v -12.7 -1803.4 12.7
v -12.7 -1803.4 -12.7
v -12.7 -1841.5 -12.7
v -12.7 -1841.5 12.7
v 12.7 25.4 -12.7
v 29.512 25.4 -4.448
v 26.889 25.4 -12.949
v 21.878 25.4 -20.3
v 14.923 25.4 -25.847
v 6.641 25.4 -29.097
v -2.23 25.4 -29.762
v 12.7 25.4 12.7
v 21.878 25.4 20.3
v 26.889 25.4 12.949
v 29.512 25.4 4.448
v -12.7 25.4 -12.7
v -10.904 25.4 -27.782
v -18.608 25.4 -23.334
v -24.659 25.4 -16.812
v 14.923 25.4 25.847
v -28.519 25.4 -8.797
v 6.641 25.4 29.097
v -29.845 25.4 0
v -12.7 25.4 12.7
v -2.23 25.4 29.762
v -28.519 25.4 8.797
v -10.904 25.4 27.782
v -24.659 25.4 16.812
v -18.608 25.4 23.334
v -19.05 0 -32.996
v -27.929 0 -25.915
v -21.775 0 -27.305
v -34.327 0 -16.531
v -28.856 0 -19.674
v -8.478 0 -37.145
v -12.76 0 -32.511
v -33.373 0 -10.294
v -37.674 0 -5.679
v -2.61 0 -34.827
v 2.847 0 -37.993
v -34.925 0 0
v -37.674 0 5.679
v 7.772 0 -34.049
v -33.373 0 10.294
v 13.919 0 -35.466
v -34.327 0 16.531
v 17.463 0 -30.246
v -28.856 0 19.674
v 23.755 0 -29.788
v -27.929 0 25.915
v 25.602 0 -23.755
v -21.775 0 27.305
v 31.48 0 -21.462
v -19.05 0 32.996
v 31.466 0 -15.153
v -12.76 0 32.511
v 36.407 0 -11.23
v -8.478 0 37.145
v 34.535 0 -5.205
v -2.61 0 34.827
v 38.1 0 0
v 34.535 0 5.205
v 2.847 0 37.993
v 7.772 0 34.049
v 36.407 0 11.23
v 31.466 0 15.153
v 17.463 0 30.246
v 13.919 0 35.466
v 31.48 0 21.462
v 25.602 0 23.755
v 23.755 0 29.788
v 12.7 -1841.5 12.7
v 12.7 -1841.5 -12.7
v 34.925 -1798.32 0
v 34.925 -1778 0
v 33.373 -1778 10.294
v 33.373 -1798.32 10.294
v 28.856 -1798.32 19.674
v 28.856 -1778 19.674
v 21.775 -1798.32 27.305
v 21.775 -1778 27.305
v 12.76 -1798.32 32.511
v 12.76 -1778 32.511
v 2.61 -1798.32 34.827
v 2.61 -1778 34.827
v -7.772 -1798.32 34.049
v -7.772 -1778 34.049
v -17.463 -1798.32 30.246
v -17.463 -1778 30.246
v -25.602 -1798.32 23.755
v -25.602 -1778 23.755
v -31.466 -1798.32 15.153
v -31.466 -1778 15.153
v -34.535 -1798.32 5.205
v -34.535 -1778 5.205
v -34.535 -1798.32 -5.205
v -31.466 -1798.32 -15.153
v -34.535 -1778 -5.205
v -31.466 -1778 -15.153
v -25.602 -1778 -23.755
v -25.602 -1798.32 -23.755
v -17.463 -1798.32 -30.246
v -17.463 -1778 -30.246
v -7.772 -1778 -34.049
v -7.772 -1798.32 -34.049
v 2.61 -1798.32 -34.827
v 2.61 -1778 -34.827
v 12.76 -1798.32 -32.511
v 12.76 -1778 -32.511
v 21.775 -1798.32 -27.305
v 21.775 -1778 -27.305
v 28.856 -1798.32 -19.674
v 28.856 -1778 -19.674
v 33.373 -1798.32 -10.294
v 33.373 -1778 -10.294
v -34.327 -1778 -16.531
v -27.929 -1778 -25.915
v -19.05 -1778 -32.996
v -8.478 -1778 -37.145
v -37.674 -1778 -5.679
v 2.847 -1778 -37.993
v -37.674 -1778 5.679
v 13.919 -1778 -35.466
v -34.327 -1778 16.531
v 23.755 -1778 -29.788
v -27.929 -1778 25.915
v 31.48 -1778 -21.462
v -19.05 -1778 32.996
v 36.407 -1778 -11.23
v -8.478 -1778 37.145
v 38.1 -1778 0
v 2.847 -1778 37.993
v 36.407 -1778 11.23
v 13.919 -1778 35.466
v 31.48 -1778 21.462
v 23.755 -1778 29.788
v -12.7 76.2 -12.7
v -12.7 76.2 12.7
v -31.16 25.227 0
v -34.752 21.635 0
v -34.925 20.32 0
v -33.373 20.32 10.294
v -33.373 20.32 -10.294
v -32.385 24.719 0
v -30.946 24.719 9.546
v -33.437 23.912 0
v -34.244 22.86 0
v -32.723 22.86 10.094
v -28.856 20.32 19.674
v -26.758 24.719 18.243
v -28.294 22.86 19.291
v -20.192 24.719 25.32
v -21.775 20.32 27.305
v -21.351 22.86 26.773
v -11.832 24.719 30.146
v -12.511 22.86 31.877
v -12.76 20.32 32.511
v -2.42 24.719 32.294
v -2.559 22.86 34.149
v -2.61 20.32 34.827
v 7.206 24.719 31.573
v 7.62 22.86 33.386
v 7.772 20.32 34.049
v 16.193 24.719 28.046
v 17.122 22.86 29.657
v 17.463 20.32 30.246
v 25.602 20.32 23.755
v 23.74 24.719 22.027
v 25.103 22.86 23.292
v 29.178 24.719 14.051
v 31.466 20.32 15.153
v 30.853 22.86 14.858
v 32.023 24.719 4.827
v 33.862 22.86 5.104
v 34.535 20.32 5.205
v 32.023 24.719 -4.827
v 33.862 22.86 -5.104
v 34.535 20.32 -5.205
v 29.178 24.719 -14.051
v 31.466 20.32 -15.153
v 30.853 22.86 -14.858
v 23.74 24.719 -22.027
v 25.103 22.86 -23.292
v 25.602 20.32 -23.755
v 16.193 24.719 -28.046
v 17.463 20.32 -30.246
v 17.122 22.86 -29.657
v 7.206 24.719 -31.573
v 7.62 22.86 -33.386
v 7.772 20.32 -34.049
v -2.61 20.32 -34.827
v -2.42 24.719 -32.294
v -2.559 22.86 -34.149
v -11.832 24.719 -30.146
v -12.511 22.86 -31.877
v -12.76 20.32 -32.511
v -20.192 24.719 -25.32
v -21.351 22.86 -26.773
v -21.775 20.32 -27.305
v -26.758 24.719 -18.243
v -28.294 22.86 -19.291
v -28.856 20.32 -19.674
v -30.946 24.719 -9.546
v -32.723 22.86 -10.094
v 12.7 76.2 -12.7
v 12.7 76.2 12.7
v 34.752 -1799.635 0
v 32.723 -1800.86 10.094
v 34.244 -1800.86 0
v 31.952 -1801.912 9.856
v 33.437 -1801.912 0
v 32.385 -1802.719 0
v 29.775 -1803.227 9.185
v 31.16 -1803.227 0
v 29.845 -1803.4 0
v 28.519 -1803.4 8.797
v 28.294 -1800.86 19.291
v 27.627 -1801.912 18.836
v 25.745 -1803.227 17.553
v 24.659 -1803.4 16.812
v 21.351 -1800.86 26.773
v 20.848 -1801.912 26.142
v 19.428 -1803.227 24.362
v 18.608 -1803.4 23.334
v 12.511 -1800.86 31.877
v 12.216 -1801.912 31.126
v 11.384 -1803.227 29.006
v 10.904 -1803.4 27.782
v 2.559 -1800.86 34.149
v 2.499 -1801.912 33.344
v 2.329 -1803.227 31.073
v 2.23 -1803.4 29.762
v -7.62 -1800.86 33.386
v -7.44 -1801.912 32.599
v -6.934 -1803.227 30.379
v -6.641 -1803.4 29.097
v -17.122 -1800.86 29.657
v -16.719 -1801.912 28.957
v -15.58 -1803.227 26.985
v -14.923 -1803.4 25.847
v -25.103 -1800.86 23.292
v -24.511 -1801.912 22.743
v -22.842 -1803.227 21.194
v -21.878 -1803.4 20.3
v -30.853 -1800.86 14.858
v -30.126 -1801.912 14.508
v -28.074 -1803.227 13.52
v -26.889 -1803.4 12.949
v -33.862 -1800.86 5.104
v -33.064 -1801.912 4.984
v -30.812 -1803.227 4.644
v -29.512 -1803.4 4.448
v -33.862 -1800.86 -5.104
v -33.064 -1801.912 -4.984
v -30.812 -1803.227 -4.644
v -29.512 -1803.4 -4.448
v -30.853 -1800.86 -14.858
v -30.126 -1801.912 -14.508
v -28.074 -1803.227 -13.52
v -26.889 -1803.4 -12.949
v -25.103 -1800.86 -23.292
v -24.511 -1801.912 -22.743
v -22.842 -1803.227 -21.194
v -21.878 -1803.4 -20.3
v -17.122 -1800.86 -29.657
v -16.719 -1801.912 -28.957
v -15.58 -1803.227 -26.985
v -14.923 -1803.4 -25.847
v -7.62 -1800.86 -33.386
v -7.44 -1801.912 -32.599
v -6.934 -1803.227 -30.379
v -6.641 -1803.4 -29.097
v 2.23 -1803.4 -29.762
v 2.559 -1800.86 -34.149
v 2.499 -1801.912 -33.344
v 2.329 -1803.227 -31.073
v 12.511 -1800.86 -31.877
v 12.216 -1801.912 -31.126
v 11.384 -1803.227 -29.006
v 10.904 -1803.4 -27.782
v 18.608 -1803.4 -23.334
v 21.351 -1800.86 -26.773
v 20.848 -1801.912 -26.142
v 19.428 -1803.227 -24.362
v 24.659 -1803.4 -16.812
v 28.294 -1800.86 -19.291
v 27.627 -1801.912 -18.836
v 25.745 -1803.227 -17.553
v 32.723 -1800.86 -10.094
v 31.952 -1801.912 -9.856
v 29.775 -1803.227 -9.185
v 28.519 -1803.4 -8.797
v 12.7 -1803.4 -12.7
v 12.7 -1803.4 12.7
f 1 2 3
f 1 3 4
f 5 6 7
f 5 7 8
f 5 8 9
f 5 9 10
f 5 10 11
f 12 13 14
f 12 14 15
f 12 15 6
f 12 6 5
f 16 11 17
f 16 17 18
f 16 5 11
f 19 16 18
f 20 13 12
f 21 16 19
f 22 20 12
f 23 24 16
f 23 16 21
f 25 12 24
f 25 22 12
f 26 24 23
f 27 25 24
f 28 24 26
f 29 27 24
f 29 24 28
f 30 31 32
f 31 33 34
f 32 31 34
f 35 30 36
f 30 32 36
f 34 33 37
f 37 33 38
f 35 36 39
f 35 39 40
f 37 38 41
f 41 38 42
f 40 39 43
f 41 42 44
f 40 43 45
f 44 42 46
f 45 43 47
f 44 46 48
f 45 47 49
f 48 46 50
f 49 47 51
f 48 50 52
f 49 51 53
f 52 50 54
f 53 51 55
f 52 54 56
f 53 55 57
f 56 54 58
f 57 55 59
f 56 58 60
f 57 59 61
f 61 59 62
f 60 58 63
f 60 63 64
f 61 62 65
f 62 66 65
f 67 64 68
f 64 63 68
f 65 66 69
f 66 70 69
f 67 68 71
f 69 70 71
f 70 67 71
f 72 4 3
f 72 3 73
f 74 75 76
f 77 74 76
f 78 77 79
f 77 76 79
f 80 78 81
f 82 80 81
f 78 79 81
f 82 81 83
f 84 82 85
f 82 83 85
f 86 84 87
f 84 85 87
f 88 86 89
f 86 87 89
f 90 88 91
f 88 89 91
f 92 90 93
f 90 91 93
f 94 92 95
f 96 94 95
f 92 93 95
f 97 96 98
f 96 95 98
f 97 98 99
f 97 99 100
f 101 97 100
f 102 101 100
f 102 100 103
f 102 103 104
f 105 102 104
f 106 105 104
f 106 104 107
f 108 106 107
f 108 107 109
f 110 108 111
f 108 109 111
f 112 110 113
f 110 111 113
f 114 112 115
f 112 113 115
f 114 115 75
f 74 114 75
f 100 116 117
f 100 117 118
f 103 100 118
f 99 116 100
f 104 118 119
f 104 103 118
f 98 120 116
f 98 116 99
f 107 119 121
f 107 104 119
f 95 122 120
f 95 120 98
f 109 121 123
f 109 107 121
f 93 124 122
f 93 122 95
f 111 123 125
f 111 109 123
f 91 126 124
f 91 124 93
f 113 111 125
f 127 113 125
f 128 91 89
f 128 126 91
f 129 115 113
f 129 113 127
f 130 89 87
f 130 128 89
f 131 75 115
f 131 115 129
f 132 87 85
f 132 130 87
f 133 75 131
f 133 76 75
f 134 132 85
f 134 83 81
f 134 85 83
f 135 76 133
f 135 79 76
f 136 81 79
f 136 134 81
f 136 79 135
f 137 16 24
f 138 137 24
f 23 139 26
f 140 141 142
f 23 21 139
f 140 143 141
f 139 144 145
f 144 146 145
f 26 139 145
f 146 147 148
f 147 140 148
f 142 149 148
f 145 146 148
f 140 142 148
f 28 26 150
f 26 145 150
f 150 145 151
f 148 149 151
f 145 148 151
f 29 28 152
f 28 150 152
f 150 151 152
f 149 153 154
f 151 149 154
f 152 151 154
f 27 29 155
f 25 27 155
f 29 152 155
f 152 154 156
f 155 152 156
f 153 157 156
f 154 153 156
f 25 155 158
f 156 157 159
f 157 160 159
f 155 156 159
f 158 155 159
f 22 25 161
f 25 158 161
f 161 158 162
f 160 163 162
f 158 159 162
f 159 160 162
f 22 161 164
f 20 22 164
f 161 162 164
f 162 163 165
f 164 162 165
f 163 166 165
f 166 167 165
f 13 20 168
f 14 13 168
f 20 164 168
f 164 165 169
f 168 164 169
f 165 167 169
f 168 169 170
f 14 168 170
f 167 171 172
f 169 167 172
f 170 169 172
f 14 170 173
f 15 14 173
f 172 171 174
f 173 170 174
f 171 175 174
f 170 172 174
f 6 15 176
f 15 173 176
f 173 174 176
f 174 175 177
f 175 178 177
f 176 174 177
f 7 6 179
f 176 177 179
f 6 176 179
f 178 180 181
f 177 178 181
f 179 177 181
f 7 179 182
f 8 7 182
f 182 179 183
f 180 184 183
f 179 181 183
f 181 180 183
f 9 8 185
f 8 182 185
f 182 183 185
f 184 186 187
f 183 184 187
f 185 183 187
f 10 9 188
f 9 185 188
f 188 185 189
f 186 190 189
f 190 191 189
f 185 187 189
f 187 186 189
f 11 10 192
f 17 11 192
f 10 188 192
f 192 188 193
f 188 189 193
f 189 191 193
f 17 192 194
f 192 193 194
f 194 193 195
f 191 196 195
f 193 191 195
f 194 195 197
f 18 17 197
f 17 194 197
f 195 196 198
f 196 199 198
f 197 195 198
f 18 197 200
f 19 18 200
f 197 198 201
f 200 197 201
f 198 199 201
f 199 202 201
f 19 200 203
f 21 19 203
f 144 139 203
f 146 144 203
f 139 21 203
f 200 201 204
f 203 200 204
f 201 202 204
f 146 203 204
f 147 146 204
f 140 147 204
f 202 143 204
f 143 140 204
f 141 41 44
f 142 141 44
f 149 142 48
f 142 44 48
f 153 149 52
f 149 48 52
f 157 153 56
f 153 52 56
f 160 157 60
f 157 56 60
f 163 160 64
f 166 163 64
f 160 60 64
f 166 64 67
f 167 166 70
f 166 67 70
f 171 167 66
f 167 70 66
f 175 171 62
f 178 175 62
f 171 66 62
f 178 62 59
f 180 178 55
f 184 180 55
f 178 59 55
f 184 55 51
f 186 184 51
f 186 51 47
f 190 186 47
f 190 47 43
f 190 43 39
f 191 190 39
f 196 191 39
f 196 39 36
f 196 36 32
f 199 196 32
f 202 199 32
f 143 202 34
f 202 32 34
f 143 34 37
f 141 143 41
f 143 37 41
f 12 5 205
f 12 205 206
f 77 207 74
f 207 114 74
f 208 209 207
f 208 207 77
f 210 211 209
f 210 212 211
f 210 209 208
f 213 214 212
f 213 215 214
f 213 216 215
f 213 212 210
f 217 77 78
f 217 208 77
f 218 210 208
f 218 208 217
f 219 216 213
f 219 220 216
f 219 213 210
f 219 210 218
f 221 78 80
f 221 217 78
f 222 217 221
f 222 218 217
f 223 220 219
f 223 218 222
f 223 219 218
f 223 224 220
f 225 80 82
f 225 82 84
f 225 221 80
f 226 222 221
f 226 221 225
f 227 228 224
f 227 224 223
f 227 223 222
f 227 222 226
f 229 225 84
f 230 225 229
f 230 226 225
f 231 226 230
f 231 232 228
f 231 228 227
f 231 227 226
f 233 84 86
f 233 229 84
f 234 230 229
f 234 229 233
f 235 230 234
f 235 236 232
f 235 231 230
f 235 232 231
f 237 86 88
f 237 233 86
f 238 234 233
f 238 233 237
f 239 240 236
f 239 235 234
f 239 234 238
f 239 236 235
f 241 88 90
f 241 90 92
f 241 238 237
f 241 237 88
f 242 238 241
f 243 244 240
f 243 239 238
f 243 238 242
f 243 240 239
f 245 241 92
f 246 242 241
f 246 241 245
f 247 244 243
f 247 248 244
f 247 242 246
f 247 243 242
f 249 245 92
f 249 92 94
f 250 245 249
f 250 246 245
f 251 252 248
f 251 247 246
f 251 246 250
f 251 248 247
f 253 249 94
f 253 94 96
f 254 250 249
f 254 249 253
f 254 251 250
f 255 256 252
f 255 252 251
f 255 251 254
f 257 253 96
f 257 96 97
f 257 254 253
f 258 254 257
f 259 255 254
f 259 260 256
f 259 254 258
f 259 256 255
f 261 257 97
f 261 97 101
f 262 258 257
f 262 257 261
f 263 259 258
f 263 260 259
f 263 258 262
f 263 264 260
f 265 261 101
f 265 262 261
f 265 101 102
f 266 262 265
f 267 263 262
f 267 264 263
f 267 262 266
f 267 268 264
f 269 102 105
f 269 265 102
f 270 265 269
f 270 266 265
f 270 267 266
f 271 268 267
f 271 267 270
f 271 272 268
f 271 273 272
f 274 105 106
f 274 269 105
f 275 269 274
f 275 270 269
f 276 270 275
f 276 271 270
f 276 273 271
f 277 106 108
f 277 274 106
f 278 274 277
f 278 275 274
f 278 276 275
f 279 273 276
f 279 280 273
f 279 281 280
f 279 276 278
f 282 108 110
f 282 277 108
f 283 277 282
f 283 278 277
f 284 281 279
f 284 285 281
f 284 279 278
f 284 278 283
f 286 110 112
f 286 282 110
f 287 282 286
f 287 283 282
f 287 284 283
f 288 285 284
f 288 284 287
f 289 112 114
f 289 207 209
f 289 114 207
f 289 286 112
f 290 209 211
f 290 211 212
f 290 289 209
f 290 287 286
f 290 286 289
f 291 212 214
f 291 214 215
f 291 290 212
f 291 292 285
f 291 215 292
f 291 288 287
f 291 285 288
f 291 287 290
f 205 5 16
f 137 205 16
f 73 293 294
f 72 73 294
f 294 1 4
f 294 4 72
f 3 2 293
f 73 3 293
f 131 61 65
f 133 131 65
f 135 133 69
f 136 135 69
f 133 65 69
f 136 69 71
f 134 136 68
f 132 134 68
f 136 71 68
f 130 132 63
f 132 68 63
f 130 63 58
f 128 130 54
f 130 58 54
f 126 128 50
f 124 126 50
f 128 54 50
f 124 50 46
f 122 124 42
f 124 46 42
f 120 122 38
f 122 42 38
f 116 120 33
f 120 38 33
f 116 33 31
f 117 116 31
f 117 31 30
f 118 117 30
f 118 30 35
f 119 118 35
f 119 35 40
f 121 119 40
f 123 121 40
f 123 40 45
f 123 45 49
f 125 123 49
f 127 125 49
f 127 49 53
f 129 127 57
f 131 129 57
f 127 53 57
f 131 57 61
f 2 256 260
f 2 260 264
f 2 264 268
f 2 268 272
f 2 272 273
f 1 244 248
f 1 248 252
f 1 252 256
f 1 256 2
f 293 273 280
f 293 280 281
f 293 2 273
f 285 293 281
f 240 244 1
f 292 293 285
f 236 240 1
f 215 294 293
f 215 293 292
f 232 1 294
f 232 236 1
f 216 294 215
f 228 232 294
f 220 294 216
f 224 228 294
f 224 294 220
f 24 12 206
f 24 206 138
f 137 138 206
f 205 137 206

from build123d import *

# Parameters (mm, degrees)
F0_R     = 38.1
F1_DEPTH = 1778
F2_R     = 34.925
F3_DEPTH = 25.4
F4_R     = 34.925
F5_DEPTH = 25.4
F6_W     = 25.4
F6_H     = 25.4
F7_DEPTH = 38.1
F8_W     = 25.4
F8_H     = 25.4
F9_DEPTH = 38.1
F10_R    = 5.08
F11_R    = 5.08


# Not quite as in the source:
# - a pattern or mirror of a feature is missing from the dataset's text; its kind, count and spacing are read off the source's solid


with BuildPart() as f1:
    # F0 (on Front) → F1 (new body)
    with BuildSketch(Plane.XZ):
        Circle(F0_R)
    extrude(amount=F1_DEPTH)

    # F2 (on face) → F3 (join)
    with BuildSketch(Plane.XZ.offset(1778)):
        Circle(F2_R)
    extrude(amount=F3_DEPTH)

    # F4 (on face) → F5 (join)
    with BuildSketch(Plane(origin=(0, 0, 0), x_dir=(-1, 0, 0), z_dir=(0, 1, 0))):
        Circle(F4_R)
    extrude(amount=F5_DEPTH)

    # F6 (on face) → F7 (join)
    with BuildSketch(Plane.XZ.offset(1803.4)):
        Rectangle(F6_W, F6_H)
    f7 = extrude(amount=F7_DEPTH)

    # F7_copies: F7 across plane
    add(f7.mirror(Plane.ZX.offset(-882.65)))

    # F8 (on face) → F9 (join)
    with BuildSketch(Plane(origin=(0, 25.4, 0), x_dir=(-1, 0, 0), z_dir=(0, 1, 0))):
        Rectangle(F8_W, F8_H)
    extrude(amount=F9_DEPTH)

    # F10
    f10_edges = [f1.edges().sort_by_distance(p)[0] for p in [
        (34.925, 25.4, 0),
    ]]
    fillet(f10_edges, radius=F10_R)

    # F11
    f11_edges = [f1.edges().sort_by_distance(p)[0] for p in [
        (-34.925, -1803.4, 0),
    ]]
    fillet(f11_edges, radius=F11_R)


solid = f1.part
